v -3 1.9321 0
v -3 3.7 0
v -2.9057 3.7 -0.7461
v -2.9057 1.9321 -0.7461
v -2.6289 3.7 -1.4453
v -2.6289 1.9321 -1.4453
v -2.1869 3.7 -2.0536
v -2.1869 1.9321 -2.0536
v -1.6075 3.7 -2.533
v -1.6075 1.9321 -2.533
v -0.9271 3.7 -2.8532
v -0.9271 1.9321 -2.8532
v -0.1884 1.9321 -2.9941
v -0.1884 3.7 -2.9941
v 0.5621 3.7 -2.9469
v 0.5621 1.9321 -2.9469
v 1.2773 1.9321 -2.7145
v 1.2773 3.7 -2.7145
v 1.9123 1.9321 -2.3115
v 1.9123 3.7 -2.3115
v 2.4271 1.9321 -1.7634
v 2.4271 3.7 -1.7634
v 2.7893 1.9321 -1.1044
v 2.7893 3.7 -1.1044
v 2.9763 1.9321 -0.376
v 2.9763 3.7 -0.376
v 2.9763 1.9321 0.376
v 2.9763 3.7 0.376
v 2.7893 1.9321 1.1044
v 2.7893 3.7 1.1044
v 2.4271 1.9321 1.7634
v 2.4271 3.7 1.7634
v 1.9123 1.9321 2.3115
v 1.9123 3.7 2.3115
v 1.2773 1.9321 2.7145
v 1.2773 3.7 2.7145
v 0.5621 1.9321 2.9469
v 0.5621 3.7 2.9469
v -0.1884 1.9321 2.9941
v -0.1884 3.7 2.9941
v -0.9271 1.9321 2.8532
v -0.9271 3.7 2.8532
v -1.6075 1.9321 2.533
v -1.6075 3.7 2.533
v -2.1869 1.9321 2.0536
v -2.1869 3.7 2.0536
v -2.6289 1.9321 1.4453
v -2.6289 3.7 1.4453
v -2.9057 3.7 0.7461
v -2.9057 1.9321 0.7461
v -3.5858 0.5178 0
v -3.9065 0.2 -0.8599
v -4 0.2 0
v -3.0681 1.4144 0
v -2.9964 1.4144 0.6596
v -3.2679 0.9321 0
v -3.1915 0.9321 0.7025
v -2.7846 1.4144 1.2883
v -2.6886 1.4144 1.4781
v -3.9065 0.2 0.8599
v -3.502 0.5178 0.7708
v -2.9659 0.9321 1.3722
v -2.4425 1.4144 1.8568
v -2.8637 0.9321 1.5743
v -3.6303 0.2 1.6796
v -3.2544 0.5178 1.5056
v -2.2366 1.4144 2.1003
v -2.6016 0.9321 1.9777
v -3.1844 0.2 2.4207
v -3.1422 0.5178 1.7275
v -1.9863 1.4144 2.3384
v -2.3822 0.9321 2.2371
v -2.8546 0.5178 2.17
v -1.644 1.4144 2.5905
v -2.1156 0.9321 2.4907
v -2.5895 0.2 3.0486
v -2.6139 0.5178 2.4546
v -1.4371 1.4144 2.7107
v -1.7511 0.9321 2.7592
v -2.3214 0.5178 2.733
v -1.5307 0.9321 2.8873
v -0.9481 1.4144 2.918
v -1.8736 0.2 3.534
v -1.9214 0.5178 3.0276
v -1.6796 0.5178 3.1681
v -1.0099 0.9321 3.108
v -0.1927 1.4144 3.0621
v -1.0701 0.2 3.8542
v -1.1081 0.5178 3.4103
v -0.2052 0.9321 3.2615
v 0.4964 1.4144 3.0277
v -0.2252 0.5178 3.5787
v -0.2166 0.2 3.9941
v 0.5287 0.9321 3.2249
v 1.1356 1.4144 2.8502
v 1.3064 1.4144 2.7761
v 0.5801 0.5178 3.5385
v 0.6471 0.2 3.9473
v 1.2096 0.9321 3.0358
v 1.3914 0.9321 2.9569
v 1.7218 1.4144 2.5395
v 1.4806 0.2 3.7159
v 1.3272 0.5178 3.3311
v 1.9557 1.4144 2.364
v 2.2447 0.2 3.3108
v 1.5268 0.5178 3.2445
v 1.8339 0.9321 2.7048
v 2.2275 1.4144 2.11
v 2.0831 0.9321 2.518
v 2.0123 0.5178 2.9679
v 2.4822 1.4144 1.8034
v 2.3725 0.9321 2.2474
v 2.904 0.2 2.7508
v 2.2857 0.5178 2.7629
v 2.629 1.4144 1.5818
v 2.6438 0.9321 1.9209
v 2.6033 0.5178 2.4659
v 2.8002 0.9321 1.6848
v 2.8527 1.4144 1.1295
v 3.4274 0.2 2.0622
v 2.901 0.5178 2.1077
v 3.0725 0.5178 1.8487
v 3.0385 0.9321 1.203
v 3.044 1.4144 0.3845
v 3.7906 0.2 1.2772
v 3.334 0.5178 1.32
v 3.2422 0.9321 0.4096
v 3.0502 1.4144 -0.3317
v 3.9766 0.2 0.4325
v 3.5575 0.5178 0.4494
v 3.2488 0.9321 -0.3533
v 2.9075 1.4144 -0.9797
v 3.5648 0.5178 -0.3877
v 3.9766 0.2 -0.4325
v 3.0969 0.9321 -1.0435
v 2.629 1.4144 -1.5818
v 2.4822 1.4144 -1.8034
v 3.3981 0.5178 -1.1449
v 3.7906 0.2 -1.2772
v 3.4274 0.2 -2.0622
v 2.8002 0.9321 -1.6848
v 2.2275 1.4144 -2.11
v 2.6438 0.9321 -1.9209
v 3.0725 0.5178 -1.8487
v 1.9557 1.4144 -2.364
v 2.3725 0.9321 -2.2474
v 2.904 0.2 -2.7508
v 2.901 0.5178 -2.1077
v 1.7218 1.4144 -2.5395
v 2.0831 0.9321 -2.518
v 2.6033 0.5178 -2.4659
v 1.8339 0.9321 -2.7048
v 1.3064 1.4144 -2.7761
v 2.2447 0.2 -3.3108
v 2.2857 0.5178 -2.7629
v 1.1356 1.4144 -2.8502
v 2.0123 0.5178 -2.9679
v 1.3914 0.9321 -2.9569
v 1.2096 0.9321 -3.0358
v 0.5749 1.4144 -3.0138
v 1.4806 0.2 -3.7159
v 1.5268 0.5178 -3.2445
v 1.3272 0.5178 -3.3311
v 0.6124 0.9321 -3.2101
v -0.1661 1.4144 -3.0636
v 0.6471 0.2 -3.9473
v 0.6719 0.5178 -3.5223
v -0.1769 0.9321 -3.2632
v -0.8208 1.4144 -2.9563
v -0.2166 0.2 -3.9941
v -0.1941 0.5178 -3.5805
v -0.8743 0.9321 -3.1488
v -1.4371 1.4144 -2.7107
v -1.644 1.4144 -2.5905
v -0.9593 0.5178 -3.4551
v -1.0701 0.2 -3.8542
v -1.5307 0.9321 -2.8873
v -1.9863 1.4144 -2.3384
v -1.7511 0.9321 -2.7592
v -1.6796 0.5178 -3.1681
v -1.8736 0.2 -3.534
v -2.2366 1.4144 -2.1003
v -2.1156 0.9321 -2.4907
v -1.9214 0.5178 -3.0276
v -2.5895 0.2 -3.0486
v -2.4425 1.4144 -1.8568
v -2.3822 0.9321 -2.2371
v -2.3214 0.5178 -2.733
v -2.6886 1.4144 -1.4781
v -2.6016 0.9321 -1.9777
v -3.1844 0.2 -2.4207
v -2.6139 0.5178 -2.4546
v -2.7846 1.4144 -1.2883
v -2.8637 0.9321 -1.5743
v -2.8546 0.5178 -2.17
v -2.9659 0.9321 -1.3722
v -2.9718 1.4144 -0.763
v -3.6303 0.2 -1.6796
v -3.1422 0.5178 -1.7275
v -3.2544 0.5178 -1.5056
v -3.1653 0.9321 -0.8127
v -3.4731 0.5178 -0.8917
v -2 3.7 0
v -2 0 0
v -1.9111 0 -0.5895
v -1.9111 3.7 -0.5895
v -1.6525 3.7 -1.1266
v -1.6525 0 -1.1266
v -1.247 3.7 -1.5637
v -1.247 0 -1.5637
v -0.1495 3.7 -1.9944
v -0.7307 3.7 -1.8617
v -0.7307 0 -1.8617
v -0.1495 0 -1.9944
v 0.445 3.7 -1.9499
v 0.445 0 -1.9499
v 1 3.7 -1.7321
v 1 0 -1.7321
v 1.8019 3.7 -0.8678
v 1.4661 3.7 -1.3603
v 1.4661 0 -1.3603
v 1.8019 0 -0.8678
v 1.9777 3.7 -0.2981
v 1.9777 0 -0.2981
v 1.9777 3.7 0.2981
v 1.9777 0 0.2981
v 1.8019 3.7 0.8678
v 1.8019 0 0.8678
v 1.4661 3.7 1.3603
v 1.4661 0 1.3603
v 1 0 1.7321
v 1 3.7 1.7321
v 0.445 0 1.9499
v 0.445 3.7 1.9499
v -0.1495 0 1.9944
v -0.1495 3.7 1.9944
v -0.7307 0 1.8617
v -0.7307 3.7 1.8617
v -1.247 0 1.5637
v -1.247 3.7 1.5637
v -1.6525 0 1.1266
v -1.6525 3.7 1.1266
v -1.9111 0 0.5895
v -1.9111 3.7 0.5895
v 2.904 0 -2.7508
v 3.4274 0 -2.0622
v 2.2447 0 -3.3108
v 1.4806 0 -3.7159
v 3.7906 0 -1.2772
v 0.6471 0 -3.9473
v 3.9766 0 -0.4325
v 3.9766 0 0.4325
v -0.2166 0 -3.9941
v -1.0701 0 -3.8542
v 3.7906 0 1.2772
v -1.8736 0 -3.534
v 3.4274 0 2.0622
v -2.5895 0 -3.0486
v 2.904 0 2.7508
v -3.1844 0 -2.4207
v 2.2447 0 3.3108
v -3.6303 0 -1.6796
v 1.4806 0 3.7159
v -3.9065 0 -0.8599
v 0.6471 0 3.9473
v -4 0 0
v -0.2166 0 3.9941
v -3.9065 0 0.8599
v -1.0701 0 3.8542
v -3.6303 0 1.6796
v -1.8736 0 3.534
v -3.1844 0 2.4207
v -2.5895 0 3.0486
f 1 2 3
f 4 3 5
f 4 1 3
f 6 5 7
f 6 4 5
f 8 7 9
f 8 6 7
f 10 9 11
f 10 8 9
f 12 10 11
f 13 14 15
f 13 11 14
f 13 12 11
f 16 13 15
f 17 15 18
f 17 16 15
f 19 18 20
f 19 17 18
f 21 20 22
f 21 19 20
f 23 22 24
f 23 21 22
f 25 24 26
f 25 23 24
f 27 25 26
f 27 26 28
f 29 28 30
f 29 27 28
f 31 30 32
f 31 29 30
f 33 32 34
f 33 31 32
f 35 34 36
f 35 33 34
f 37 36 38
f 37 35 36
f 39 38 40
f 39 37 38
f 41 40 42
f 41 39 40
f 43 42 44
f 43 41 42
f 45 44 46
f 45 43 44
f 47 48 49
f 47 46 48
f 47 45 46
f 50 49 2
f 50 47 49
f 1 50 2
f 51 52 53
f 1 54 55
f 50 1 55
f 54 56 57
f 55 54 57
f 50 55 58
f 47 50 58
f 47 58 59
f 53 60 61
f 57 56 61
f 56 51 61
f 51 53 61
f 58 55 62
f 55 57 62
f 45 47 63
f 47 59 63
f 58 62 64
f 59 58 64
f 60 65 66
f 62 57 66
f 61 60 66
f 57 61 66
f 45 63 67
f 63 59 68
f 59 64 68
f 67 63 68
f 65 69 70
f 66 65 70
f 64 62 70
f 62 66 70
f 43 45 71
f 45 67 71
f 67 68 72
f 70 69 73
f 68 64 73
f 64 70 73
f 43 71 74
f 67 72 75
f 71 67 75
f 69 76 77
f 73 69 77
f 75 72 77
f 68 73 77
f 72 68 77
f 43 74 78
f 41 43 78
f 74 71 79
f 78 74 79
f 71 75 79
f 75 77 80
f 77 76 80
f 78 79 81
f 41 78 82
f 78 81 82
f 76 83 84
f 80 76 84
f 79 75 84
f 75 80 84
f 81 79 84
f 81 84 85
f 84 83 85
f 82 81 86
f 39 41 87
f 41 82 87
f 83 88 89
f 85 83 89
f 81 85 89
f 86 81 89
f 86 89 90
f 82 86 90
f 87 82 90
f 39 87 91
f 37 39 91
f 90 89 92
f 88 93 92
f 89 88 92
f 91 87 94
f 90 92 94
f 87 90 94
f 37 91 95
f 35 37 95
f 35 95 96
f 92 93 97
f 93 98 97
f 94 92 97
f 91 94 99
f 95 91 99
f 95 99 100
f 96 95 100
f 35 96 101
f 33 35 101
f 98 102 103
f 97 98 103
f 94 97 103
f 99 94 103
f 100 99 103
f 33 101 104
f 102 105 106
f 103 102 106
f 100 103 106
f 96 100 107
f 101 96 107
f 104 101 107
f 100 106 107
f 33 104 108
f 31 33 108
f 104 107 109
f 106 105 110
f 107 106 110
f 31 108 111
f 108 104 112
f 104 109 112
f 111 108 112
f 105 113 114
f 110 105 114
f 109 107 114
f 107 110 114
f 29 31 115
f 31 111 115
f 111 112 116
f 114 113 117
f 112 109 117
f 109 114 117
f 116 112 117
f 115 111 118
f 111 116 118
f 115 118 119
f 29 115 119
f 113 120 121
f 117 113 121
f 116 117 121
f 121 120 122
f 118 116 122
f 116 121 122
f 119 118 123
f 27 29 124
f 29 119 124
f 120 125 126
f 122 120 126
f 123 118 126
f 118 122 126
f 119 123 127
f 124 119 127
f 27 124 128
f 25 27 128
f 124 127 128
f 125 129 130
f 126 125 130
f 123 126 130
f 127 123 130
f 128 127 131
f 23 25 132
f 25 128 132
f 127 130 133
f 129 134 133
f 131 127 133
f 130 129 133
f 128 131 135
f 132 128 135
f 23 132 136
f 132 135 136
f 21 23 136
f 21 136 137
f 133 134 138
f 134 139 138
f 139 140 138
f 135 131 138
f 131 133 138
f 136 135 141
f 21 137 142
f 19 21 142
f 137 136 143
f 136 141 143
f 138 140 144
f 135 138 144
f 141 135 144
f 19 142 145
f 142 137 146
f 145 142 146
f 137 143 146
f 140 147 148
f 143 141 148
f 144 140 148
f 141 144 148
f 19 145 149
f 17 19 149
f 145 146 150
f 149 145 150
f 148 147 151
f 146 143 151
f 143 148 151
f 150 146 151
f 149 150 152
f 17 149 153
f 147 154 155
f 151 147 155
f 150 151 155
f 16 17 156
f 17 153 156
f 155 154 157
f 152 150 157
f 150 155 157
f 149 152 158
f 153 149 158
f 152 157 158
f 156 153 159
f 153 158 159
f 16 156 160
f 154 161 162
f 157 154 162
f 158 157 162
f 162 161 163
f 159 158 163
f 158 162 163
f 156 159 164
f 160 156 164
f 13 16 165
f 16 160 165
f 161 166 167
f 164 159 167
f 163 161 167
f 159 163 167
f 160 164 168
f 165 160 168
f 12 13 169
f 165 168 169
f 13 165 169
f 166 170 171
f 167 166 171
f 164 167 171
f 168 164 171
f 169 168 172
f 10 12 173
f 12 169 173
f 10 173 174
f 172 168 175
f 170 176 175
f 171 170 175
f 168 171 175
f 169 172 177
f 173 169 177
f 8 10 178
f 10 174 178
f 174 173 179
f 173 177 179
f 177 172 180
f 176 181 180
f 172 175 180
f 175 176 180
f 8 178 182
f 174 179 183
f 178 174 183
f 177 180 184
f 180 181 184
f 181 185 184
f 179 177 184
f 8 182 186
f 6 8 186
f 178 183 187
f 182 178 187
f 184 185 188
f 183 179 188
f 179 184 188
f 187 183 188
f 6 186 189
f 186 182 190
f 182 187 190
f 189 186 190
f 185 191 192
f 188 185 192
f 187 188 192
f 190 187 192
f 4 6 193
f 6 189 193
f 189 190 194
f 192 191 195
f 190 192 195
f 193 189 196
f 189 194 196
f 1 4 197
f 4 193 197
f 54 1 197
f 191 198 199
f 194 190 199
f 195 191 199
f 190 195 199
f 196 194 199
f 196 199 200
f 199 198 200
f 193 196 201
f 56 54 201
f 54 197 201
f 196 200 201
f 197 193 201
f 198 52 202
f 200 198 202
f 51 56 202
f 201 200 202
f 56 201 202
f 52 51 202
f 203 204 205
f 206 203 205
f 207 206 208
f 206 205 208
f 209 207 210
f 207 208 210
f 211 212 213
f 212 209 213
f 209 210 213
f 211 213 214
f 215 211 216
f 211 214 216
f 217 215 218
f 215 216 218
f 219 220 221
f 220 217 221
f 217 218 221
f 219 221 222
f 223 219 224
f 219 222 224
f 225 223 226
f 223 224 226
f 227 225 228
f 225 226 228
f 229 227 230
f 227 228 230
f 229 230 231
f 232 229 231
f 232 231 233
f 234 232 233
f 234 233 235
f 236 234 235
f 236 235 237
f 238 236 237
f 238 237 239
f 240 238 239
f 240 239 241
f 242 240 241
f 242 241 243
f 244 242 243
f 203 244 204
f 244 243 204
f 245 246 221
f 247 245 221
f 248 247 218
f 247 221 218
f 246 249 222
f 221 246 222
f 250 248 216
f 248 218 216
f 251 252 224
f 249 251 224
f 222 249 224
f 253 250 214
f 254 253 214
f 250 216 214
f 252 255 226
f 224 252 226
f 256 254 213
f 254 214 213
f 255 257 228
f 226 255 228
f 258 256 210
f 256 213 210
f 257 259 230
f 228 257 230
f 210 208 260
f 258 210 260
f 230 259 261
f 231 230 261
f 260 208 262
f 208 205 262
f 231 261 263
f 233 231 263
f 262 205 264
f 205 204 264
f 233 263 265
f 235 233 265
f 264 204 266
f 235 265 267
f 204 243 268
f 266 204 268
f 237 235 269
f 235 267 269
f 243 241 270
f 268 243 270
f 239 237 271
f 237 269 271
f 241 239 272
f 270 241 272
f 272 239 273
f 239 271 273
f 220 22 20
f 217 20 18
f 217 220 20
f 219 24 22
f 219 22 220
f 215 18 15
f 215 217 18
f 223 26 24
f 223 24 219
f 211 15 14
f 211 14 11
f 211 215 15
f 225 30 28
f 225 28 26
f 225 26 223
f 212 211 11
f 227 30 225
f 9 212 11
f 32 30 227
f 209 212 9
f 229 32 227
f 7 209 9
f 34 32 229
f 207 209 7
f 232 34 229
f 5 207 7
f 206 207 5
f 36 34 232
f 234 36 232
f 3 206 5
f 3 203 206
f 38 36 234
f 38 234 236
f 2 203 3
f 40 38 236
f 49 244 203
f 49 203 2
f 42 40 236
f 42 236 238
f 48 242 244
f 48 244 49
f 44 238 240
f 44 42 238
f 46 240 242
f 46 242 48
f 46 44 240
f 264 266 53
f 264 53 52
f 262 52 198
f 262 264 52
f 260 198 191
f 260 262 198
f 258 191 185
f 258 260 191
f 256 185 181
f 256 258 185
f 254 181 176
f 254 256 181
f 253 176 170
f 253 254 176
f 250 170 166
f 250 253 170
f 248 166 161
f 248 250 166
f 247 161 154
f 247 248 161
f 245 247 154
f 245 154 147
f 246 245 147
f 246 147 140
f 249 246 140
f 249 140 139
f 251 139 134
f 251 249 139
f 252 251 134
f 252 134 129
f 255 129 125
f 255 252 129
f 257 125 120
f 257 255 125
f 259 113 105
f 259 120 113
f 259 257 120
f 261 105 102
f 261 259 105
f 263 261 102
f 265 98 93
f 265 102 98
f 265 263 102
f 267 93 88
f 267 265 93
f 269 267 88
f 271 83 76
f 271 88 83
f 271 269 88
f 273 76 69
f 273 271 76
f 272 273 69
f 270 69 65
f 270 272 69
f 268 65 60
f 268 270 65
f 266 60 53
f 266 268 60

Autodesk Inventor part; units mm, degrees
ref_plane "YZ Plane" through (0, 0, 0) normal (1, 0, 0) x (0, 1, 0)
ref_plane "XZ Plane" through (0, 0, 0) normal (0, 1, 0) x (-1, 0, 0)
ref_plane "XY Plane" through (0, 0, 0) normal (0, 0, 1) x (1, 0, 0)
sketch "Sketch1" plane through (0, 0, 0) normal (0, 1, 0) x (-1, 0, 0)
  circle A0 centre (0, 0) radius 2
  circle A1 centre (0, 0) radius 3
  circle A2 centre (0, 0) radius 4
  dimension "d0" = 4
  dimension "d1" = 6
  dimension "d2" = 8
extrude "Extrusion1" add sketch "Sketch1" along normal blind 0.2 contours A1 | A2
extrude "Extrusion2" add sketch "Sketch1" along normal blind 3.7 contours A1
fillet "Fillet1" radius 2 1 edges at (3, 0.2, 0)
properties part number "replacement standoff"
